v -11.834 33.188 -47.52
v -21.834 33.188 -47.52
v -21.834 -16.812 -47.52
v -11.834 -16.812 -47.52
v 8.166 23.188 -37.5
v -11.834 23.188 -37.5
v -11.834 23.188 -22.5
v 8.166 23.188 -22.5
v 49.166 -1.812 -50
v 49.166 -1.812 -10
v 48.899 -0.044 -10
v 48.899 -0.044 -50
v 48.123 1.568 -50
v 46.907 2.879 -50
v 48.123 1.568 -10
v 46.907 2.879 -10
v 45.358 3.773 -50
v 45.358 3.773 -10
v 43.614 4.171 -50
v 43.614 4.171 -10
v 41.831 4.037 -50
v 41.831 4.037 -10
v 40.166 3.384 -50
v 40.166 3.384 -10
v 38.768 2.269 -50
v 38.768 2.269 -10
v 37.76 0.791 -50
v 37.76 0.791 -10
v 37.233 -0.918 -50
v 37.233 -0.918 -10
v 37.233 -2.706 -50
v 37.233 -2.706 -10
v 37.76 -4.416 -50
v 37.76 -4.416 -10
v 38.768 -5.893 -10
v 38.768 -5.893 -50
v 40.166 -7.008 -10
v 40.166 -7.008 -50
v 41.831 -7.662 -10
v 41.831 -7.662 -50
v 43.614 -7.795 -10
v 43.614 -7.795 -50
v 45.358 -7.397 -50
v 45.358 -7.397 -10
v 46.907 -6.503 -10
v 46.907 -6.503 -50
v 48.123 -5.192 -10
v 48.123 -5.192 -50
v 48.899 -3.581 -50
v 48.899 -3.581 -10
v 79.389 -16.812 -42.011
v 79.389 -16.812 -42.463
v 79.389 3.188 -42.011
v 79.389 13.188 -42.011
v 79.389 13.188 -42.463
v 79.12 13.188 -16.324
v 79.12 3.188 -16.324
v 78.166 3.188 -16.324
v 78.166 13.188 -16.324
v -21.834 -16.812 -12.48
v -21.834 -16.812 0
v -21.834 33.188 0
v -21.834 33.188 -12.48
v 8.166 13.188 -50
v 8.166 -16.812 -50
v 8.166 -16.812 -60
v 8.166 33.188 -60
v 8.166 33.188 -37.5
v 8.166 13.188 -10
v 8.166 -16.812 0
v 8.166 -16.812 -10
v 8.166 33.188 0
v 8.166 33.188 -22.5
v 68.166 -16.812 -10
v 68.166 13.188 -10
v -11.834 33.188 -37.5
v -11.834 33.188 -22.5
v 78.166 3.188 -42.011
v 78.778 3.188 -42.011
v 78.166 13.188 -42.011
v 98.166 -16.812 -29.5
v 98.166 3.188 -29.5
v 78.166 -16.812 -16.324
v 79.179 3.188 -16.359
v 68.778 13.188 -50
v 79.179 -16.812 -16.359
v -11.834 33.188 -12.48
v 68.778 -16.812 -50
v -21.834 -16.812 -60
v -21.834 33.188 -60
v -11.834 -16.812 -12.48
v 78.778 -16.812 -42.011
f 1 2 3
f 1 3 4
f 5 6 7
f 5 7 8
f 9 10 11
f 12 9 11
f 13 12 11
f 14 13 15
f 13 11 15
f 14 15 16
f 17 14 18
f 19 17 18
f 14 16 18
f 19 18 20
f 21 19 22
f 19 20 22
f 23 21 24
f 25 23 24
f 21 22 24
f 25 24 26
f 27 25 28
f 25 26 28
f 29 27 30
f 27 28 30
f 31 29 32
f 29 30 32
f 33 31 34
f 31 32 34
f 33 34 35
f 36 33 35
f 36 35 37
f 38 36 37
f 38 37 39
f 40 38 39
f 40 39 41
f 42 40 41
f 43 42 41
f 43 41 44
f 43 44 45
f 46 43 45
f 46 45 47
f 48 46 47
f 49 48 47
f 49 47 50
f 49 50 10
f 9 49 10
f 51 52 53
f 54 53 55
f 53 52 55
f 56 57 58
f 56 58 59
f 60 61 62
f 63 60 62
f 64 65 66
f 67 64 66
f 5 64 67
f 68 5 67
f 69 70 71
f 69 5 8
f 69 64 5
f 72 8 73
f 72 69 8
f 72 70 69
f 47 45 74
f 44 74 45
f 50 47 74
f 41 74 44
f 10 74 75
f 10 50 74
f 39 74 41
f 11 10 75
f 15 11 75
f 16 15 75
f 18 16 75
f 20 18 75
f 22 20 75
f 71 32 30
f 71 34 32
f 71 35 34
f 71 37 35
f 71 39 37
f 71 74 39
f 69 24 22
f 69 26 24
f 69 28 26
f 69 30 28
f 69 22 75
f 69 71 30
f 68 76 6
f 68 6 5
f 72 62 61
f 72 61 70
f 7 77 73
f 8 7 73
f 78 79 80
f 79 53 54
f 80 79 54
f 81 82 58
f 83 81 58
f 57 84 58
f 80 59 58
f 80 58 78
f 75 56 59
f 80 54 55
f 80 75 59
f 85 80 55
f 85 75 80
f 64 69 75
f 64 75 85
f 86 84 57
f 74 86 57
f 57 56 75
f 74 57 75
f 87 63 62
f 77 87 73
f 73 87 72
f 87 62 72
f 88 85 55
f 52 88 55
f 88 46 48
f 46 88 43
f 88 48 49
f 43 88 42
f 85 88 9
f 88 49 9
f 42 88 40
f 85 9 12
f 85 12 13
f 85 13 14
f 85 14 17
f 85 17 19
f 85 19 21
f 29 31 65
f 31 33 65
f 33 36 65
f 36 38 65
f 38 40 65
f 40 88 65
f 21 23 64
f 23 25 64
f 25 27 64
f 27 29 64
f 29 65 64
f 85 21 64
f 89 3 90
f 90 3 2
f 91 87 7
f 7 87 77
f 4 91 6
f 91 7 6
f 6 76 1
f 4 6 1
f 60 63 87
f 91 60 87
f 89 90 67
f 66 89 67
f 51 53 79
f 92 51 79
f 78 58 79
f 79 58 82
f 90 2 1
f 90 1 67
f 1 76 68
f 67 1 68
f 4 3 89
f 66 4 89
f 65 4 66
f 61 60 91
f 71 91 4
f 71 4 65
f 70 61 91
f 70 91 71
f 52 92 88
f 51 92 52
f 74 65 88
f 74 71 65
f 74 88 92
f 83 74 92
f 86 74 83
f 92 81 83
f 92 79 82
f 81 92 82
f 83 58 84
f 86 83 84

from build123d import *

# Parameters (mm, degrees)
SKETCH1_W           = 30
SKETCH1_H           = 50
BOSS_EXTRUDE1_DEPTH = 60
SKETCH2_W           = 40
SKETCH2_H           = 30
BOSS_EXTRUDE2_DEPTH = 90
SKETCH3_R           = 6
CUT_EXTRUDE1_DEPTH  = 90
CUT_EXTRUDE3_DEPTH  = 90
SKETCH6_W           = 25.687042716
SKETCH6_H           = 10
CUT_EXTRUDE4_DEPTH  = 20
SKETCH7_W           = 18.776678674
SKETCH7_H           = 30
CUT_EXTRUDE5_DEPTH  = 6
SKETCH8_W           = 18.776678674
SKETCH8_H           = 30
CUT_EXTRUDE6_DEPTH  = 1
SKETCH9_W           = 18.776678674
SKETCH9_H           = 30
CUT_EXTRUDE7_DEPTH  = 8
CUT_EXTRUDE8_DEPTH  = 48
SKETCH11_W          = 20
SKETCH11_H          = 15
CUT_EXTRUDE9_DEPTH  = 10
SKETCH12_W          = 10
SKETCH12_H          = 35.03931538
CUT_EXTRUDE10_DEPTH = 70


with BuildPart() as part:
    # Sketch1 → Boss-Extrude1 (new body)
    with BuildSketch(Plane.XY):
        with Locations((-6.834061135, 8.187772926)):
            Rectangle(SKETCH1_W, SKETCH1_H)
    extrude(amount=-BOSS_EXTRUDE1_DEPTH)

    # Sketch2 → Boss-Extrude2 (add)
    with BuildSketch(Plane(origin=(8.165938865, 0, 0), x_dir=(0, 0, -1), z_dir=(1, 0, 0))):
        with Locations((30, -1.812227074)):
            Rectangle(SKETCH2_W, SKETCH2_H)
    extrude(amount=BOSS_EXTRUDE2_DEPTH)

    # Sketch3 → Cut-Extrude1 (cut)
    with BuildSketch(Plane.XY.offset(-10)):
        with Locations((43.165938865, -1.812227074)):
            Circle(SKETCH3_R)
    extrude(amount=-CUT_EXTRUDE1_DEPTH, mode=Mode.SUBTRACT)

    # Sketch4 → Cut-Extrude3 (cut)
    with BuildSketch(Plane(origin=(0, 13.187772926, 0), x_dir=(1, 0, 0), z_dir=(0, 1, 0))):
        Polygon((79.389260191, 50), (68.777599528, 50), (79.389260191, 42.463070185), align=None)
        Polygon((79.389260191, 16.479787589), (68.165938865, 10), (79.389260191, 10), align=None)
    extrude(amount=-CUT_EXTRUDE3_DEPTH, mode=Mode.SUBTRACT)

    # Sketch6 → Cut-Extrude4 (cut)
    with BuildSketch(Plane(origin=(98.165938865, 0, 0), x_dir=(0, 0, -1), z_dir=(1, 0, 0))):
        with Locations((29.167914445, 8.187772926)):
            Rectangle(SKETCH6_W, SKETCH6_H)
    extrude(amount=-CUT_EXTRUDE4_DEPTH, mode=Mode.SUBTRACT)

    # Sketch7 → Cut-Extrude5 (cut)
    with BuildSketch(Plane.XY.offset(-10)):
        with Locations((88.777599528, -1.812227074)):
            Rectangle(SKETCH7_W, SKETCH7_H)
    extrude(amount=-CUT_EXTRUDE5_DEPTH, mode=Mode.SUBTRACT)

    # Sketch8 → Cut-Extrude6 (cut)
    with BuildSketch(Plane.XY.offset(-16)):
        with Locations((88.777599528, -1.812227074)):
            Rectangle(SKETCH8_W, SKETCH8_H)
    extrude(amount=-CUT_EXTRUDE6_DEPTH, mode=Mode.SUBTRACT)

    # Sketch9 → Cut-Extrude7 (cut)
    with BuildSketch(Plane(origin=(0, 0, -50), x_dir=(-1, 0, 0), z_dir=(0, 0, -1))):
        with Locations((-88.777599528, -1.812227074)):
            Rectangle(SKETCH9_W, SKETCH9_H)
    extrude(amount=-CUT_EXTRUDE7_DEPTH, mode=Mode.SUBTRACT)

    # Sketch10 → Cut-Extrude8 (cut)
    with BuildSketch(Plane(origin=(0, 3.187772926, 0), x_dir=(1, 0, 0), z_dir=(0, 1, 0))):
        Polygon((98.165938865, 17), (98.165938865, 29.5), (78.165938865, 16.324393087), (79.179406262, 16.358628366), (79.389260191, 16.479787589), (79.389260191, 17), align=None)
        Polygon((79.389260191, 42.011075028), (78.777599528, 42.011435803), (98.165938865, 29.5), (98.165938865, 42), (79.389260191, 42), align=None)
    extrude(amount=-CUT_EXTRUDE8_DEPTH, mode=Mode.SUBTRACT)

    # Sketch11 → Cut-Extrude9 (cut)
    with BuildSketch(Plane(origin=(0, 33.187772926, 0), x_dir=(1, 0, 0), z_dir=(0, 1, 0))):
        with Locations((-1.834061135, 30)):
            Rectangle(SKETCH11_W, SKETCH11_H)
    extrude(amount=-CUT_EXTRUDE9_DEPTH, mode=Mode.SUBTRACT)

    # Sketch12 → Cut-Extrude10 (cut)
    with BuildSketch(Plane(origin=(0, 33.187772926, 0), x_dir=(1, 0, 0), z_dir=(0, 1, 0))):
        with Locations((-16.834061135, 30)):
            Rectangle(SKETCH12_W, SKETCH12_H)
    extrude(amount=-CUT_EXTRUDE10_DEPTH, mode=Mode.SUBTRACT)


solid = part.part
